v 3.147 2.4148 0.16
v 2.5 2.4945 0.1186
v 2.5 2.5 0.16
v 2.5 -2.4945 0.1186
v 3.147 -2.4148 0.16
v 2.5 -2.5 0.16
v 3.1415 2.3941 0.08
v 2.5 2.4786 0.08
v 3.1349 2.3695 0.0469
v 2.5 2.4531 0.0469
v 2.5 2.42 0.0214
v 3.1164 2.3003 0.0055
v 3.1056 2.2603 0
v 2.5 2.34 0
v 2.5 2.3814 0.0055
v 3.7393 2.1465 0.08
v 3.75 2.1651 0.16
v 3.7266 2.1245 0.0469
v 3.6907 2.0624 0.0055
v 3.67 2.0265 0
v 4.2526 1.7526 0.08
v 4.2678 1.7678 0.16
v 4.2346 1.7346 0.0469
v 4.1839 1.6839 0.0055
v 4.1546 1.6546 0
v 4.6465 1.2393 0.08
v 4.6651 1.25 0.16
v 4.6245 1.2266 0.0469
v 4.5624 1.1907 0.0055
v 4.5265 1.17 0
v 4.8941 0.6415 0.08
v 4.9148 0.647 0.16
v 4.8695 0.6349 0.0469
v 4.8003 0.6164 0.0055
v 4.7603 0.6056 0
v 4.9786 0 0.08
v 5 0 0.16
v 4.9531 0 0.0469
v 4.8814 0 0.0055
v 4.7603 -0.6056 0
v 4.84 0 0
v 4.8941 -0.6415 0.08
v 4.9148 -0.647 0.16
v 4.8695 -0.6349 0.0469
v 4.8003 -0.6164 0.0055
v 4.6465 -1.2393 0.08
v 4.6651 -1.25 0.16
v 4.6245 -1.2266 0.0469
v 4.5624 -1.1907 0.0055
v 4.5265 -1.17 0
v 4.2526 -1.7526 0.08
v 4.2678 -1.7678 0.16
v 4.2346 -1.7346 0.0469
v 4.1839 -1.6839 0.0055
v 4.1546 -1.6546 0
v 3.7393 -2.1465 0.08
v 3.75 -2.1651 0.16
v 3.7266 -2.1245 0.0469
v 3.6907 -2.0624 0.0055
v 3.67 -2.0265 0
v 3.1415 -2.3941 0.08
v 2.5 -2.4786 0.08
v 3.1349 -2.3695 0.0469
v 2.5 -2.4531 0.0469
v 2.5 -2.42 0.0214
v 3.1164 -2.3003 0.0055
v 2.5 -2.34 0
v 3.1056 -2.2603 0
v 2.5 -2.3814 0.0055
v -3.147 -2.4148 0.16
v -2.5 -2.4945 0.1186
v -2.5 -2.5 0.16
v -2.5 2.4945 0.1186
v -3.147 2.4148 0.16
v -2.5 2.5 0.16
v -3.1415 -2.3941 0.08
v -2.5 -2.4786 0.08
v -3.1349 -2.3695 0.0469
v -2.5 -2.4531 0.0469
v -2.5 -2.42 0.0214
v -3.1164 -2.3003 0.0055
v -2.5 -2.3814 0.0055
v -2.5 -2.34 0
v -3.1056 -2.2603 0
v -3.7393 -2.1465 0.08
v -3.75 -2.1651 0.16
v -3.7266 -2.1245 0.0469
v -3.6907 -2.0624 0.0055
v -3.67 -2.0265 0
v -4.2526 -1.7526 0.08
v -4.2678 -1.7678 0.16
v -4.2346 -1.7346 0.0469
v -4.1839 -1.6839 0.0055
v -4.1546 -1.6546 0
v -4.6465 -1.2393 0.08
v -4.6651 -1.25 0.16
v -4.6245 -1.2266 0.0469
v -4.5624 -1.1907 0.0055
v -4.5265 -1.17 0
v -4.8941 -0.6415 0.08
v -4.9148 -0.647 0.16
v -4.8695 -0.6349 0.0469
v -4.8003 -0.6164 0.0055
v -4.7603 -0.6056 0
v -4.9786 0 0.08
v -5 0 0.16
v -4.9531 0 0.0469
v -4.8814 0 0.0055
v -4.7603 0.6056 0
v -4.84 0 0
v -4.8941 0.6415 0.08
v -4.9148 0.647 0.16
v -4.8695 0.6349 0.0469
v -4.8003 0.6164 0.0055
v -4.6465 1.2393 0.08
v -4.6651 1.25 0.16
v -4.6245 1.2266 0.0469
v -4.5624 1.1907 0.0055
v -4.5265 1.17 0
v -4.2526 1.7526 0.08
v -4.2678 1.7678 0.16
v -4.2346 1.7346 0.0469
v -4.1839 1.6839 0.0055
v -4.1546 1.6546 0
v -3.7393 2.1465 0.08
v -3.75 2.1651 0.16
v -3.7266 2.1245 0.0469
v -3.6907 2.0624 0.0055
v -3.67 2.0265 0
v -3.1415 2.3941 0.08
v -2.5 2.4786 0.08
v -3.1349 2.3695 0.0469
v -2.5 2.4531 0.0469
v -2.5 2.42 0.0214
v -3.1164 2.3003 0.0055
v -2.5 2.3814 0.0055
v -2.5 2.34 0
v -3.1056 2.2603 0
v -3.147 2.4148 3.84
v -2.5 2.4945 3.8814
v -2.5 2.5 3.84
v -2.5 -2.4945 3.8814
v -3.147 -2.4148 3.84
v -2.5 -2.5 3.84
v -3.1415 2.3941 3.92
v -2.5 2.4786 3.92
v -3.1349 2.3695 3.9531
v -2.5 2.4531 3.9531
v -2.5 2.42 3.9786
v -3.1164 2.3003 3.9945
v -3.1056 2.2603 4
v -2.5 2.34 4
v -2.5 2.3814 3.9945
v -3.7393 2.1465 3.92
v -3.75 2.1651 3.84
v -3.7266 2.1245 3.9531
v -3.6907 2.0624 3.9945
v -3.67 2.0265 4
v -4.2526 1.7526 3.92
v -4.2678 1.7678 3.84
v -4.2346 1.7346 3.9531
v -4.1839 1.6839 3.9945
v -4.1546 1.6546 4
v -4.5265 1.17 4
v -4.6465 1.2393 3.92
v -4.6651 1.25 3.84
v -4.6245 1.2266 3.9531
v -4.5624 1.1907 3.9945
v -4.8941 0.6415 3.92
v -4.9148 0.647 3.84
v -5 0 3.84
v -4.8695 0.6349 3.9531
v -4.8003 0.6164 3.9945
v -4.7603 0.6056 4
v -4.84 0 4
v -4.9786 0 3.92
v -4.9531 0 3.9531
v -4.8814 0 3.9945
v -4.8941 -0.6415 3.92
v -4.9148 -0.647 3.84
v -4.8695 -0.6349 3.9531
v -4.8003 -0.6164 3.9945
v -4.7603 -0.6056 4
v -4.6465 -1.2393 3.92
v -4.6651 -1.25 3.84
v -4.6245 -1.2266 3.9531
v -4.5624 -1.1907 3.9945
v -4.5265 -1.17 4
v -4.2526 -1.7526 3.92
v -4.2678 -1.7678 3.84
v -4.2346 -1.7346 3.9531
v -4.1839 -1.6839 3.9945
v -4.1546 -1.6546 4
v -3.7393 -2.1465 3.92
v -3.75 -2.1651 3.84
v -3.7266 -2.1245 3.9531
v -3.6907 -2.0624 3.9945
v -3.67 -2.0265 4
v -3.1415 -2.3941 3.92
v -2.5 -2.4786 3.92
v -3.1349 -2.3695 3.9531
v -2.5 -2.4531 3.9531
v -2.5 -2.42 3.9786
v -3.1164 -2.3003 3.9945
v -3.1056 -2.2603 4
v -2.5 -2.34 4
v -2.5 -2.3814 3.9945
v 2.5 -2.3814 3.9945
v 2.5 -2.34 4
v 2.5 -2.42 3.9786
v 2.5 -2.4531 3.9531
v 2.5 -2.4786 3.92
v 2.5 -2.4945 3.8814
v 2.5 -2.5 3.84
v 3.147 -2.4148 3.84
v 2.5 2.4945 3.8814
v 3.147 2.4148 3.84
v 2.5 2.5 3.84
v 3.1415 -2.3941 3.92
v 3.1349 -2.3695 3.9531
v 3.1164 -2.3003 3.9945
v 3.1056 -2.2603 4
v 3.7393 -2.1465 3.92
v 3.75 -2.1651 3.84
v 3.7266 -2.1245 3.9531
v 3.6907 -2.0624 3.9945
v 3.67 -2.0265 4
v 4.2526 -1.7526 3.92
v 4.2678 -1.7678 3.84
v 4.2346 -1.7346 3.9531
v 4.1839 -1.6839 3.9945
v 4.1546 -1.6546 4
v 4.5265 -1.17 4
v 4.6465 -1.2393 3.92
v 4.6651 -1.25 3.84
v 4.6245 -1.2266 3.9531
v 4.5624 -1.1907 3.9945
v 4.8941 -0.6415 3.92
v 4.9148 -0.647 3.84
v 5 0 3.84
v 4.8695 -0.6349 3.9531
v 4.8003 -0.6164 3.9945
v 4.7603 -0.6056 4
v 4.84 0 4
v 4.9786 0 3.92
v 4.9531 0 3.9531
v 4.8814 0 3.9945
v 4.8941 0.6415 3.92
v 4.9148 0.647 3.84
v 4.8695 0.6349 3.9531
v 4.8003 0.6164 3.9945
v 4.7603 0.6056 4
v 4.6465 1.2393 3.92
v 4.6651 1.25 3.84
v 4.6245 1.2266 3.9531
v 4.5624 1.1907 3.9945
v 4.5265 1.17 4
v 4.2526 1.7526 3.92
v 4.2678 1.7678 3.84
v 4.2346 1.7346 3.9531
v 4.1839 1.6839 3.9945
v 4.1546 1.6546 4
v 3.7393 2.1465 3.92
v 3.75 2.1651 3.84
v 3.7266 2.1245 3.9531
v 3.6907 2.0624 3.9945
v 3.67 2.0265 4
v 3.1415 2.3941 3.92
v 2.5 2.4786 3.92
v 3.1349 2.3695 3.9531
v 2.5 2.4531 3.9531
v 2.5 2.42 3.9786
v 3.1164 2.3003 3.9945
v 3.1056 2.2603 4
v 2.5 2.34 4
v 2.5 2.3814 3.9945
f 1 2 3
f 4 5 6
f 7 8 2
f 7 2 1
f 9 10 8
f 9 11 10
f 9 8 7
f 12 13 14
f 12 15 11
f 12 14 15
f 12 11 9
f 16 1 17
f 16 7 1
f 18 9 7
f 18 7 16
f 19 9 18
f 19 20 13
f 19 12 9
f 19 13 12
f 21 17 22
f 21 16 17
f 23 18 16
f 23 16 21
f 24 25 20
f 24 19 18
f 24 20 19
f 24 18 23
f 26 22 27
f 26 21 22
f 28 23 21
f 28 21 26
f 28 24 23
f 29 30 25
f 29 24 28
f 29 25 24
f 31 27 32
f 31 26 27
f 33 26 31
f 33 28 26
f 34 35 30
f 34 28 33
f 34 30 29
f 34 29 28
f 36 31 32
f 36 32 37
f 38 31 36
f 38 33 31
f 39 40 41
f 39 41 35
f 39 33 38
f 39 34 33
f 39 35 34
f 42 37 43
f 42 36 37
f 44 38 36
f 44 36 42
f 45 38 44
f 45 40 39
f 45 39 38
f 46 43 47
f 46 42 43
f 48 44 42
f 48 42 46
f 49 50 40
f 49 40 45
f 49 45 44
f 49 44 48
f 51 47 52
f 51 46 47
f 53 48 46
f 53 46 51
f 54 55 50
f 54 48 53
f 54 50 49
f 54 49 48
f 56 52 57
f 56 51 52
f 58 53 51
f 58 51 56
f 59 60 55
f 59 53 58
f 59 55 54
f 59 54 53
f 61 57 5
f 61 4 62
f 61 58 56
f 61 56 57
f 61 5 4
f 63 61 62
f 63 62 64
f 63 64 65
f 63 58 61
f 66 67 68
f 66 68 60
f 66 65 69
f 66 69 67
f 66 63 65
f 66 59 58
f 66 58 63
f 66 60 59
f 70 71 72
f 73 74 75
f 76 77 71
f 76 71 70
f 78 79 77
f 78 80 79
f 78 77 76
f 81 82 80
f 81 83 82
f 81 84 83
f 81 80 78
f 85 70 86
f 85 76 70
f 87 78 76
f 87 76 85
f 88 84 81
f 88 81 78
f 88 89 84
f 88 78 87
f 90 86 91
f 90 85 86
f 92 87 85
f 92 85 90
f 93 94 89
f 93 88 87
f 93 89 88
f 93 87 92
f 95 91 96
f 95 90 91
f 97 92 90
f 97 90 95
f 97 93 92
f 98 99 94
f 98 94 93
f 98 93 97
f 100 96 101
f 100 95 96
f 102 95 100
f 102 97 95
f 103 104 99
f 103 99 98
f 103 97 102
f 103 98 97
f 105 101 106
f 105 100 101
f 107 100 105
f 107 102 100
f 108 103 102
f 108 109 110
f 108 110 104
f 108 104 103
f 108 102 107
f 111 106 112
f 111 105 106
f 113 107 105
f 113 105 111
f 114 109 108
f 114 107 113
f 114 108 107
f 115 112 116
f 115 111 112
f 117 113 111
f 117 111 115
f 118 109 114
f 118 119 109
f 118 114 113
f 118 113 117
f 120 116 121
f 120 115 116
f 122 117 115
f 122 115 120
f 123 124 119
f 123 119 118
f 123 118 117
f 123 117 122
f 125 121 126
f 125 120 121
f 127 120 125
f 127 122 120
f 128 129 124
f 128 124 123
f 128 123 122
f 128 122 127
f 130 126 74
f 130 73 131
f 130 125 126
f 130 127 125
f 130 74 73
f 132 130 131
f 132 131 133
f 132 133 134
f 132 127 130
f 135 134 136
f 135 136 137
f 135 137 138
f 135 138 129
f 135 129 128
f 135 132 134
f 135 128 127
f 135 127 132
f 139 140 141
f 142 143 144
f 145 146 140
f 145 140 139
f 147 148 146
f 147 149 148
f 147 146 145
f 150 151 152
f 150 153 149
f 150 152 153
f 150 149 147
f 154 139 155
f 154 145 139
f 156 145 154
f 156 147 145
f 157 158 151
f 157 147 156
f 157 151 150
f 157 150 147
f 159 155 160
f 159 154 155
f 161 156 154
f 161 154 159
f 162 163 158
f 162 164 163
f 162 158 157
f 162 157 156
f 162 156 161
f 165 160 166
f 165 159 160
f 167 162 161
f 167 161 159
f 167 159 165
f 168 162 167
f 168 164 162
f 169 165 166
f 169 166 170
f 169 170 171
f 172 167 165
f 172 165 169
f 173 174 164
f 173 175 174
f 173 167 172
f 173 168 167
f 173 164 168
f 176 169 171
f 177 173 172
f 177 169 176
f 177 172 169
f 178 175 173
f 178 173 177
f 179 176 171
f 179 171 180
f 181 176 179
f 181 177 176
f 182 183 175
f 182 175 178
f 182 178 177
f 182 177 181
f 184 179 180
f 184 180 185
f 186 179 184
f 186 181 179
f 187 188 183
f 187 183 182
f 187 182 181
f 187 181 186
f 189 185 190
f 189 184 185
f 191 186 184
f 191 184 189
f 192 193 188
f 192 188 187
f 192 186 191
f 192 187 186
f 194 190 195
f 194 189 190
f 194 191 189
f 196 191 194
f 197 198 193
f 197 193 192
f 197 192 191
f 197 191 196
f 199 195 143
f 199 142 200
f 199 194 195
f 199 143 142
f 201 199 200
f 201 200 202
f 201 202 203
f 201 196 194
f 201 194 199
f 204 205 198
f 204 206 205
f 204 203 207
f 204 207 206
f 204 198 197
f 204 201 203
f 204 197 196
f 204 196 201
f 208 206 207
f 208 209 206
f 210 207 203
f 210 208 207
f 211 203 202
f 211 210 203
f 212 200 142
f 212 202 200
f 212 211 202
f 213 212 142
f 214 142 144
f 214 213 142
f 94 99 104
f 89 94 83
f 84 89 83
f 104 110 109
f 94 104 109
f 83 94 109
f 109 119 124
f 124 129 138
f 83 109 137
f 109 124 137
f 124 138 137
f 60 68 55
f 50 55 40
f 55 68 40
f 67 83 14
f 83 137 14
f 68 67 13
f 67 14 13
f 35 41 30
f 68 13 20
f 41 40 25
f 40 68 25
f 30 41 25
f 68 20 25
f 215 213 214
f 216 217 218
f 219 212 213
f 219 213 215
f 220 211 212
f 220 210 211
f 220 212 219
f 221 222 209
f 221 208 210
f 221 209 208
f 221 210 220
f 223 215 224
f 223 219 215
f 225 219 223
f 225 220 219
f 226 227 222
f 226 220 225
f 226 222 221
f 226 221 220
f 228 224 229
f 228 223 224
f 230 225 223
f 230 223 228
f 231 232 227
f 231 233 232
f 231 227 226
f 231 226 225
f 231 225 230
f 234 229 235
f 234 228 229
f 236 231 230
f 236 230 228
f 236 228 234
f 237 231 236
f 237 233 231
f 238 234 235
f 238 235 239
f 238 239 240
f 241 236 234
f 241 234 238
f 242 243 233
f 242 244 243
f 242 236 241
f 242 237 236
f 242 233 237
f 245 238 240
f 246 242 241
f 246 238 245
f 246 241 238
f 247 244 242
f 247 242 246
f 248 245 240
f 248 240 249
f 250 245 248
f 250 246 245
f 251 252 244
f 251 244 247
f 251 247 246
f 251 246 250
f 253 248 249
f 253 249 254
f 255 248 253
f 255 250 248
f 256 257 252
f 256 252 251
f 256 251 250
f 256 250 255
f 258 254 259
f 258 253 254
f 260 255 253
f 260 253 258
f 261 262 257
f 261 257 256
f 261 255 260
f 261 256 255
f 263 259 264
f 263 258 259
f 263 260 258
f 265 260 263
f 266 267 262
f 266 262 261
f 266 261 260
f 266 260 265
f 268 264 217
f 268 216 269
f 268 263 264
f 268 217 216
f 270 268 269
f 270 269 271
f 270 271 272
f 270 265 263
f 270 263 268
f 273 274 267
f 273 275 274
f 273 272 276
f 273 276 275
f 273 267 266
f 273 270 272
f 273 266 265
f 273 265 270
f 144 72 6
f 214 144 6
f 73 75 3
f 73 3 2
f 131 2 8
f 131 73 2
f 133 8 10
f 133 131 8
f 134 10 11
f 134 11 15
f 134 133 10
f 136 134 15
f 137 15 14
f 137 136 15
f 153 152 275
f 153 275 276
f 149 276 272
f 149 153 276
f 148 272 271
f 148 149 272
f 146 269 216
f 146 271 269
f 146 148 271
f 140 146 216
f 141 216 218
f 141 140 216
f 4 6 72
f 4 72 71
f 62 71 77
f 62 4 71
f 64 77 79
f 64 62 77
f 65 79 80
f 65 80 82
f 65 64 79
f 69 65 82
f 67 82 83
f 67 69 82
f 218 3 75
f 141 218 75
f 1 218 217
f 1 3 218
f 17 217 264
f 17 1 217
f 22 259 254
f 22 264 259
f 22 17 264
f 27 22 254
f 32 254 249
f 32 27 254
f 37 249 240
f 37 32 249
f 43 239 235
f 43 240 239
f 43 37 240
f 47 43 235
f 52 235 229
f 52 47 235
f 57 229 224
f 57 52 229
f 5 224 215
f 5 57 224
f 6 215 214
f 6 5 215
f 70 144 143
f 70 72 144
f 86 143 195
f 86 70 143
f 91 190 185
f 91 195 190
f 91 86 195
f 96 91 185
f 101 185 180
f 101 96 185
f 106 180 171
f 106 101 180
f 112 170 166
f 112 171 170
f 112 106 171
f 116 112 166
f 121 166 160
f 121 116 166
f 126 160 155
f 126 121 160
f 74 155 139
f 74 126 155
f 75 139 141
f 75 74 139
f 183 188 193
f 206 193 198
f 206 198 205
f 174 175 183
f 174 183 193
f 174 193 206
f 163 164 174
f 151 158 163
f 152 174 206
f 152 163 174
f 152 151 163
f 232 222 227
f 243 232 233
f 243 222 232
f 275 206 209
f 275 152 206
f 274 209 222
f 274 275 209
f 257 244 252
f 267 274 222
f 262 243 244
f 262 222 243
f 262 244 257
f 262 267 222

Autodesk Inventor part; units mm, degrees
ref_plane "YZ Plane" through (0, 0, 0) normal (1, 0, 0) x (0, 1, 0)
ref_plane "XZ Plane" through (0, 0, 0) normal (0, 1, 0) x (-1, 0, 0)
ref_plane "XY Plane" through (0, 0, 0) normal (0, 0, 1) x (1, 0, 0)
sketch "草圖1" plane through (0, 0, 0) normal (0, 0, 1) x (1, 0, 0)
  line L0 (-2.5, -2.5) -> (2.5, -2.5)
  line L1 (2.5, -2.5) -> (2.5, 2.5)
  line L2 (2.5, 2.5) -> (-2.5, 2.5)
  line L3 (-2.5, 2.5) -> (-2.5, -2.5)
  line L4 (-2.5, -2.5) -> (2.5, 2.5) construction
  line L5 (2.5, -2.5) -> (-2.5, 2.5) construction
  arc A0 (-2.5, 2.5) -> (-2.5, -2.5) centre (-2.5, 0) ccw
  arc A1 (2.5, -2.5) -> (2.5, 2.5) centre (2.5, 0) ccw
  point P0 (0, 0)
  dimension "d0" = 5
  dimension "d1" = 5
extrude "擠出1" add sketch "草圖1" along normal blind 4
fillet "圓角1" radius 0.16 8 edges at (-5, 0, 4) (0, -2.5, 4) (5, 0, 4) (0, 2.5, 4) (5, 0, 0) (0, -2.5, 0) (-5, 0, 0) (0, 2.5, 0)
properties part number "key_3"
